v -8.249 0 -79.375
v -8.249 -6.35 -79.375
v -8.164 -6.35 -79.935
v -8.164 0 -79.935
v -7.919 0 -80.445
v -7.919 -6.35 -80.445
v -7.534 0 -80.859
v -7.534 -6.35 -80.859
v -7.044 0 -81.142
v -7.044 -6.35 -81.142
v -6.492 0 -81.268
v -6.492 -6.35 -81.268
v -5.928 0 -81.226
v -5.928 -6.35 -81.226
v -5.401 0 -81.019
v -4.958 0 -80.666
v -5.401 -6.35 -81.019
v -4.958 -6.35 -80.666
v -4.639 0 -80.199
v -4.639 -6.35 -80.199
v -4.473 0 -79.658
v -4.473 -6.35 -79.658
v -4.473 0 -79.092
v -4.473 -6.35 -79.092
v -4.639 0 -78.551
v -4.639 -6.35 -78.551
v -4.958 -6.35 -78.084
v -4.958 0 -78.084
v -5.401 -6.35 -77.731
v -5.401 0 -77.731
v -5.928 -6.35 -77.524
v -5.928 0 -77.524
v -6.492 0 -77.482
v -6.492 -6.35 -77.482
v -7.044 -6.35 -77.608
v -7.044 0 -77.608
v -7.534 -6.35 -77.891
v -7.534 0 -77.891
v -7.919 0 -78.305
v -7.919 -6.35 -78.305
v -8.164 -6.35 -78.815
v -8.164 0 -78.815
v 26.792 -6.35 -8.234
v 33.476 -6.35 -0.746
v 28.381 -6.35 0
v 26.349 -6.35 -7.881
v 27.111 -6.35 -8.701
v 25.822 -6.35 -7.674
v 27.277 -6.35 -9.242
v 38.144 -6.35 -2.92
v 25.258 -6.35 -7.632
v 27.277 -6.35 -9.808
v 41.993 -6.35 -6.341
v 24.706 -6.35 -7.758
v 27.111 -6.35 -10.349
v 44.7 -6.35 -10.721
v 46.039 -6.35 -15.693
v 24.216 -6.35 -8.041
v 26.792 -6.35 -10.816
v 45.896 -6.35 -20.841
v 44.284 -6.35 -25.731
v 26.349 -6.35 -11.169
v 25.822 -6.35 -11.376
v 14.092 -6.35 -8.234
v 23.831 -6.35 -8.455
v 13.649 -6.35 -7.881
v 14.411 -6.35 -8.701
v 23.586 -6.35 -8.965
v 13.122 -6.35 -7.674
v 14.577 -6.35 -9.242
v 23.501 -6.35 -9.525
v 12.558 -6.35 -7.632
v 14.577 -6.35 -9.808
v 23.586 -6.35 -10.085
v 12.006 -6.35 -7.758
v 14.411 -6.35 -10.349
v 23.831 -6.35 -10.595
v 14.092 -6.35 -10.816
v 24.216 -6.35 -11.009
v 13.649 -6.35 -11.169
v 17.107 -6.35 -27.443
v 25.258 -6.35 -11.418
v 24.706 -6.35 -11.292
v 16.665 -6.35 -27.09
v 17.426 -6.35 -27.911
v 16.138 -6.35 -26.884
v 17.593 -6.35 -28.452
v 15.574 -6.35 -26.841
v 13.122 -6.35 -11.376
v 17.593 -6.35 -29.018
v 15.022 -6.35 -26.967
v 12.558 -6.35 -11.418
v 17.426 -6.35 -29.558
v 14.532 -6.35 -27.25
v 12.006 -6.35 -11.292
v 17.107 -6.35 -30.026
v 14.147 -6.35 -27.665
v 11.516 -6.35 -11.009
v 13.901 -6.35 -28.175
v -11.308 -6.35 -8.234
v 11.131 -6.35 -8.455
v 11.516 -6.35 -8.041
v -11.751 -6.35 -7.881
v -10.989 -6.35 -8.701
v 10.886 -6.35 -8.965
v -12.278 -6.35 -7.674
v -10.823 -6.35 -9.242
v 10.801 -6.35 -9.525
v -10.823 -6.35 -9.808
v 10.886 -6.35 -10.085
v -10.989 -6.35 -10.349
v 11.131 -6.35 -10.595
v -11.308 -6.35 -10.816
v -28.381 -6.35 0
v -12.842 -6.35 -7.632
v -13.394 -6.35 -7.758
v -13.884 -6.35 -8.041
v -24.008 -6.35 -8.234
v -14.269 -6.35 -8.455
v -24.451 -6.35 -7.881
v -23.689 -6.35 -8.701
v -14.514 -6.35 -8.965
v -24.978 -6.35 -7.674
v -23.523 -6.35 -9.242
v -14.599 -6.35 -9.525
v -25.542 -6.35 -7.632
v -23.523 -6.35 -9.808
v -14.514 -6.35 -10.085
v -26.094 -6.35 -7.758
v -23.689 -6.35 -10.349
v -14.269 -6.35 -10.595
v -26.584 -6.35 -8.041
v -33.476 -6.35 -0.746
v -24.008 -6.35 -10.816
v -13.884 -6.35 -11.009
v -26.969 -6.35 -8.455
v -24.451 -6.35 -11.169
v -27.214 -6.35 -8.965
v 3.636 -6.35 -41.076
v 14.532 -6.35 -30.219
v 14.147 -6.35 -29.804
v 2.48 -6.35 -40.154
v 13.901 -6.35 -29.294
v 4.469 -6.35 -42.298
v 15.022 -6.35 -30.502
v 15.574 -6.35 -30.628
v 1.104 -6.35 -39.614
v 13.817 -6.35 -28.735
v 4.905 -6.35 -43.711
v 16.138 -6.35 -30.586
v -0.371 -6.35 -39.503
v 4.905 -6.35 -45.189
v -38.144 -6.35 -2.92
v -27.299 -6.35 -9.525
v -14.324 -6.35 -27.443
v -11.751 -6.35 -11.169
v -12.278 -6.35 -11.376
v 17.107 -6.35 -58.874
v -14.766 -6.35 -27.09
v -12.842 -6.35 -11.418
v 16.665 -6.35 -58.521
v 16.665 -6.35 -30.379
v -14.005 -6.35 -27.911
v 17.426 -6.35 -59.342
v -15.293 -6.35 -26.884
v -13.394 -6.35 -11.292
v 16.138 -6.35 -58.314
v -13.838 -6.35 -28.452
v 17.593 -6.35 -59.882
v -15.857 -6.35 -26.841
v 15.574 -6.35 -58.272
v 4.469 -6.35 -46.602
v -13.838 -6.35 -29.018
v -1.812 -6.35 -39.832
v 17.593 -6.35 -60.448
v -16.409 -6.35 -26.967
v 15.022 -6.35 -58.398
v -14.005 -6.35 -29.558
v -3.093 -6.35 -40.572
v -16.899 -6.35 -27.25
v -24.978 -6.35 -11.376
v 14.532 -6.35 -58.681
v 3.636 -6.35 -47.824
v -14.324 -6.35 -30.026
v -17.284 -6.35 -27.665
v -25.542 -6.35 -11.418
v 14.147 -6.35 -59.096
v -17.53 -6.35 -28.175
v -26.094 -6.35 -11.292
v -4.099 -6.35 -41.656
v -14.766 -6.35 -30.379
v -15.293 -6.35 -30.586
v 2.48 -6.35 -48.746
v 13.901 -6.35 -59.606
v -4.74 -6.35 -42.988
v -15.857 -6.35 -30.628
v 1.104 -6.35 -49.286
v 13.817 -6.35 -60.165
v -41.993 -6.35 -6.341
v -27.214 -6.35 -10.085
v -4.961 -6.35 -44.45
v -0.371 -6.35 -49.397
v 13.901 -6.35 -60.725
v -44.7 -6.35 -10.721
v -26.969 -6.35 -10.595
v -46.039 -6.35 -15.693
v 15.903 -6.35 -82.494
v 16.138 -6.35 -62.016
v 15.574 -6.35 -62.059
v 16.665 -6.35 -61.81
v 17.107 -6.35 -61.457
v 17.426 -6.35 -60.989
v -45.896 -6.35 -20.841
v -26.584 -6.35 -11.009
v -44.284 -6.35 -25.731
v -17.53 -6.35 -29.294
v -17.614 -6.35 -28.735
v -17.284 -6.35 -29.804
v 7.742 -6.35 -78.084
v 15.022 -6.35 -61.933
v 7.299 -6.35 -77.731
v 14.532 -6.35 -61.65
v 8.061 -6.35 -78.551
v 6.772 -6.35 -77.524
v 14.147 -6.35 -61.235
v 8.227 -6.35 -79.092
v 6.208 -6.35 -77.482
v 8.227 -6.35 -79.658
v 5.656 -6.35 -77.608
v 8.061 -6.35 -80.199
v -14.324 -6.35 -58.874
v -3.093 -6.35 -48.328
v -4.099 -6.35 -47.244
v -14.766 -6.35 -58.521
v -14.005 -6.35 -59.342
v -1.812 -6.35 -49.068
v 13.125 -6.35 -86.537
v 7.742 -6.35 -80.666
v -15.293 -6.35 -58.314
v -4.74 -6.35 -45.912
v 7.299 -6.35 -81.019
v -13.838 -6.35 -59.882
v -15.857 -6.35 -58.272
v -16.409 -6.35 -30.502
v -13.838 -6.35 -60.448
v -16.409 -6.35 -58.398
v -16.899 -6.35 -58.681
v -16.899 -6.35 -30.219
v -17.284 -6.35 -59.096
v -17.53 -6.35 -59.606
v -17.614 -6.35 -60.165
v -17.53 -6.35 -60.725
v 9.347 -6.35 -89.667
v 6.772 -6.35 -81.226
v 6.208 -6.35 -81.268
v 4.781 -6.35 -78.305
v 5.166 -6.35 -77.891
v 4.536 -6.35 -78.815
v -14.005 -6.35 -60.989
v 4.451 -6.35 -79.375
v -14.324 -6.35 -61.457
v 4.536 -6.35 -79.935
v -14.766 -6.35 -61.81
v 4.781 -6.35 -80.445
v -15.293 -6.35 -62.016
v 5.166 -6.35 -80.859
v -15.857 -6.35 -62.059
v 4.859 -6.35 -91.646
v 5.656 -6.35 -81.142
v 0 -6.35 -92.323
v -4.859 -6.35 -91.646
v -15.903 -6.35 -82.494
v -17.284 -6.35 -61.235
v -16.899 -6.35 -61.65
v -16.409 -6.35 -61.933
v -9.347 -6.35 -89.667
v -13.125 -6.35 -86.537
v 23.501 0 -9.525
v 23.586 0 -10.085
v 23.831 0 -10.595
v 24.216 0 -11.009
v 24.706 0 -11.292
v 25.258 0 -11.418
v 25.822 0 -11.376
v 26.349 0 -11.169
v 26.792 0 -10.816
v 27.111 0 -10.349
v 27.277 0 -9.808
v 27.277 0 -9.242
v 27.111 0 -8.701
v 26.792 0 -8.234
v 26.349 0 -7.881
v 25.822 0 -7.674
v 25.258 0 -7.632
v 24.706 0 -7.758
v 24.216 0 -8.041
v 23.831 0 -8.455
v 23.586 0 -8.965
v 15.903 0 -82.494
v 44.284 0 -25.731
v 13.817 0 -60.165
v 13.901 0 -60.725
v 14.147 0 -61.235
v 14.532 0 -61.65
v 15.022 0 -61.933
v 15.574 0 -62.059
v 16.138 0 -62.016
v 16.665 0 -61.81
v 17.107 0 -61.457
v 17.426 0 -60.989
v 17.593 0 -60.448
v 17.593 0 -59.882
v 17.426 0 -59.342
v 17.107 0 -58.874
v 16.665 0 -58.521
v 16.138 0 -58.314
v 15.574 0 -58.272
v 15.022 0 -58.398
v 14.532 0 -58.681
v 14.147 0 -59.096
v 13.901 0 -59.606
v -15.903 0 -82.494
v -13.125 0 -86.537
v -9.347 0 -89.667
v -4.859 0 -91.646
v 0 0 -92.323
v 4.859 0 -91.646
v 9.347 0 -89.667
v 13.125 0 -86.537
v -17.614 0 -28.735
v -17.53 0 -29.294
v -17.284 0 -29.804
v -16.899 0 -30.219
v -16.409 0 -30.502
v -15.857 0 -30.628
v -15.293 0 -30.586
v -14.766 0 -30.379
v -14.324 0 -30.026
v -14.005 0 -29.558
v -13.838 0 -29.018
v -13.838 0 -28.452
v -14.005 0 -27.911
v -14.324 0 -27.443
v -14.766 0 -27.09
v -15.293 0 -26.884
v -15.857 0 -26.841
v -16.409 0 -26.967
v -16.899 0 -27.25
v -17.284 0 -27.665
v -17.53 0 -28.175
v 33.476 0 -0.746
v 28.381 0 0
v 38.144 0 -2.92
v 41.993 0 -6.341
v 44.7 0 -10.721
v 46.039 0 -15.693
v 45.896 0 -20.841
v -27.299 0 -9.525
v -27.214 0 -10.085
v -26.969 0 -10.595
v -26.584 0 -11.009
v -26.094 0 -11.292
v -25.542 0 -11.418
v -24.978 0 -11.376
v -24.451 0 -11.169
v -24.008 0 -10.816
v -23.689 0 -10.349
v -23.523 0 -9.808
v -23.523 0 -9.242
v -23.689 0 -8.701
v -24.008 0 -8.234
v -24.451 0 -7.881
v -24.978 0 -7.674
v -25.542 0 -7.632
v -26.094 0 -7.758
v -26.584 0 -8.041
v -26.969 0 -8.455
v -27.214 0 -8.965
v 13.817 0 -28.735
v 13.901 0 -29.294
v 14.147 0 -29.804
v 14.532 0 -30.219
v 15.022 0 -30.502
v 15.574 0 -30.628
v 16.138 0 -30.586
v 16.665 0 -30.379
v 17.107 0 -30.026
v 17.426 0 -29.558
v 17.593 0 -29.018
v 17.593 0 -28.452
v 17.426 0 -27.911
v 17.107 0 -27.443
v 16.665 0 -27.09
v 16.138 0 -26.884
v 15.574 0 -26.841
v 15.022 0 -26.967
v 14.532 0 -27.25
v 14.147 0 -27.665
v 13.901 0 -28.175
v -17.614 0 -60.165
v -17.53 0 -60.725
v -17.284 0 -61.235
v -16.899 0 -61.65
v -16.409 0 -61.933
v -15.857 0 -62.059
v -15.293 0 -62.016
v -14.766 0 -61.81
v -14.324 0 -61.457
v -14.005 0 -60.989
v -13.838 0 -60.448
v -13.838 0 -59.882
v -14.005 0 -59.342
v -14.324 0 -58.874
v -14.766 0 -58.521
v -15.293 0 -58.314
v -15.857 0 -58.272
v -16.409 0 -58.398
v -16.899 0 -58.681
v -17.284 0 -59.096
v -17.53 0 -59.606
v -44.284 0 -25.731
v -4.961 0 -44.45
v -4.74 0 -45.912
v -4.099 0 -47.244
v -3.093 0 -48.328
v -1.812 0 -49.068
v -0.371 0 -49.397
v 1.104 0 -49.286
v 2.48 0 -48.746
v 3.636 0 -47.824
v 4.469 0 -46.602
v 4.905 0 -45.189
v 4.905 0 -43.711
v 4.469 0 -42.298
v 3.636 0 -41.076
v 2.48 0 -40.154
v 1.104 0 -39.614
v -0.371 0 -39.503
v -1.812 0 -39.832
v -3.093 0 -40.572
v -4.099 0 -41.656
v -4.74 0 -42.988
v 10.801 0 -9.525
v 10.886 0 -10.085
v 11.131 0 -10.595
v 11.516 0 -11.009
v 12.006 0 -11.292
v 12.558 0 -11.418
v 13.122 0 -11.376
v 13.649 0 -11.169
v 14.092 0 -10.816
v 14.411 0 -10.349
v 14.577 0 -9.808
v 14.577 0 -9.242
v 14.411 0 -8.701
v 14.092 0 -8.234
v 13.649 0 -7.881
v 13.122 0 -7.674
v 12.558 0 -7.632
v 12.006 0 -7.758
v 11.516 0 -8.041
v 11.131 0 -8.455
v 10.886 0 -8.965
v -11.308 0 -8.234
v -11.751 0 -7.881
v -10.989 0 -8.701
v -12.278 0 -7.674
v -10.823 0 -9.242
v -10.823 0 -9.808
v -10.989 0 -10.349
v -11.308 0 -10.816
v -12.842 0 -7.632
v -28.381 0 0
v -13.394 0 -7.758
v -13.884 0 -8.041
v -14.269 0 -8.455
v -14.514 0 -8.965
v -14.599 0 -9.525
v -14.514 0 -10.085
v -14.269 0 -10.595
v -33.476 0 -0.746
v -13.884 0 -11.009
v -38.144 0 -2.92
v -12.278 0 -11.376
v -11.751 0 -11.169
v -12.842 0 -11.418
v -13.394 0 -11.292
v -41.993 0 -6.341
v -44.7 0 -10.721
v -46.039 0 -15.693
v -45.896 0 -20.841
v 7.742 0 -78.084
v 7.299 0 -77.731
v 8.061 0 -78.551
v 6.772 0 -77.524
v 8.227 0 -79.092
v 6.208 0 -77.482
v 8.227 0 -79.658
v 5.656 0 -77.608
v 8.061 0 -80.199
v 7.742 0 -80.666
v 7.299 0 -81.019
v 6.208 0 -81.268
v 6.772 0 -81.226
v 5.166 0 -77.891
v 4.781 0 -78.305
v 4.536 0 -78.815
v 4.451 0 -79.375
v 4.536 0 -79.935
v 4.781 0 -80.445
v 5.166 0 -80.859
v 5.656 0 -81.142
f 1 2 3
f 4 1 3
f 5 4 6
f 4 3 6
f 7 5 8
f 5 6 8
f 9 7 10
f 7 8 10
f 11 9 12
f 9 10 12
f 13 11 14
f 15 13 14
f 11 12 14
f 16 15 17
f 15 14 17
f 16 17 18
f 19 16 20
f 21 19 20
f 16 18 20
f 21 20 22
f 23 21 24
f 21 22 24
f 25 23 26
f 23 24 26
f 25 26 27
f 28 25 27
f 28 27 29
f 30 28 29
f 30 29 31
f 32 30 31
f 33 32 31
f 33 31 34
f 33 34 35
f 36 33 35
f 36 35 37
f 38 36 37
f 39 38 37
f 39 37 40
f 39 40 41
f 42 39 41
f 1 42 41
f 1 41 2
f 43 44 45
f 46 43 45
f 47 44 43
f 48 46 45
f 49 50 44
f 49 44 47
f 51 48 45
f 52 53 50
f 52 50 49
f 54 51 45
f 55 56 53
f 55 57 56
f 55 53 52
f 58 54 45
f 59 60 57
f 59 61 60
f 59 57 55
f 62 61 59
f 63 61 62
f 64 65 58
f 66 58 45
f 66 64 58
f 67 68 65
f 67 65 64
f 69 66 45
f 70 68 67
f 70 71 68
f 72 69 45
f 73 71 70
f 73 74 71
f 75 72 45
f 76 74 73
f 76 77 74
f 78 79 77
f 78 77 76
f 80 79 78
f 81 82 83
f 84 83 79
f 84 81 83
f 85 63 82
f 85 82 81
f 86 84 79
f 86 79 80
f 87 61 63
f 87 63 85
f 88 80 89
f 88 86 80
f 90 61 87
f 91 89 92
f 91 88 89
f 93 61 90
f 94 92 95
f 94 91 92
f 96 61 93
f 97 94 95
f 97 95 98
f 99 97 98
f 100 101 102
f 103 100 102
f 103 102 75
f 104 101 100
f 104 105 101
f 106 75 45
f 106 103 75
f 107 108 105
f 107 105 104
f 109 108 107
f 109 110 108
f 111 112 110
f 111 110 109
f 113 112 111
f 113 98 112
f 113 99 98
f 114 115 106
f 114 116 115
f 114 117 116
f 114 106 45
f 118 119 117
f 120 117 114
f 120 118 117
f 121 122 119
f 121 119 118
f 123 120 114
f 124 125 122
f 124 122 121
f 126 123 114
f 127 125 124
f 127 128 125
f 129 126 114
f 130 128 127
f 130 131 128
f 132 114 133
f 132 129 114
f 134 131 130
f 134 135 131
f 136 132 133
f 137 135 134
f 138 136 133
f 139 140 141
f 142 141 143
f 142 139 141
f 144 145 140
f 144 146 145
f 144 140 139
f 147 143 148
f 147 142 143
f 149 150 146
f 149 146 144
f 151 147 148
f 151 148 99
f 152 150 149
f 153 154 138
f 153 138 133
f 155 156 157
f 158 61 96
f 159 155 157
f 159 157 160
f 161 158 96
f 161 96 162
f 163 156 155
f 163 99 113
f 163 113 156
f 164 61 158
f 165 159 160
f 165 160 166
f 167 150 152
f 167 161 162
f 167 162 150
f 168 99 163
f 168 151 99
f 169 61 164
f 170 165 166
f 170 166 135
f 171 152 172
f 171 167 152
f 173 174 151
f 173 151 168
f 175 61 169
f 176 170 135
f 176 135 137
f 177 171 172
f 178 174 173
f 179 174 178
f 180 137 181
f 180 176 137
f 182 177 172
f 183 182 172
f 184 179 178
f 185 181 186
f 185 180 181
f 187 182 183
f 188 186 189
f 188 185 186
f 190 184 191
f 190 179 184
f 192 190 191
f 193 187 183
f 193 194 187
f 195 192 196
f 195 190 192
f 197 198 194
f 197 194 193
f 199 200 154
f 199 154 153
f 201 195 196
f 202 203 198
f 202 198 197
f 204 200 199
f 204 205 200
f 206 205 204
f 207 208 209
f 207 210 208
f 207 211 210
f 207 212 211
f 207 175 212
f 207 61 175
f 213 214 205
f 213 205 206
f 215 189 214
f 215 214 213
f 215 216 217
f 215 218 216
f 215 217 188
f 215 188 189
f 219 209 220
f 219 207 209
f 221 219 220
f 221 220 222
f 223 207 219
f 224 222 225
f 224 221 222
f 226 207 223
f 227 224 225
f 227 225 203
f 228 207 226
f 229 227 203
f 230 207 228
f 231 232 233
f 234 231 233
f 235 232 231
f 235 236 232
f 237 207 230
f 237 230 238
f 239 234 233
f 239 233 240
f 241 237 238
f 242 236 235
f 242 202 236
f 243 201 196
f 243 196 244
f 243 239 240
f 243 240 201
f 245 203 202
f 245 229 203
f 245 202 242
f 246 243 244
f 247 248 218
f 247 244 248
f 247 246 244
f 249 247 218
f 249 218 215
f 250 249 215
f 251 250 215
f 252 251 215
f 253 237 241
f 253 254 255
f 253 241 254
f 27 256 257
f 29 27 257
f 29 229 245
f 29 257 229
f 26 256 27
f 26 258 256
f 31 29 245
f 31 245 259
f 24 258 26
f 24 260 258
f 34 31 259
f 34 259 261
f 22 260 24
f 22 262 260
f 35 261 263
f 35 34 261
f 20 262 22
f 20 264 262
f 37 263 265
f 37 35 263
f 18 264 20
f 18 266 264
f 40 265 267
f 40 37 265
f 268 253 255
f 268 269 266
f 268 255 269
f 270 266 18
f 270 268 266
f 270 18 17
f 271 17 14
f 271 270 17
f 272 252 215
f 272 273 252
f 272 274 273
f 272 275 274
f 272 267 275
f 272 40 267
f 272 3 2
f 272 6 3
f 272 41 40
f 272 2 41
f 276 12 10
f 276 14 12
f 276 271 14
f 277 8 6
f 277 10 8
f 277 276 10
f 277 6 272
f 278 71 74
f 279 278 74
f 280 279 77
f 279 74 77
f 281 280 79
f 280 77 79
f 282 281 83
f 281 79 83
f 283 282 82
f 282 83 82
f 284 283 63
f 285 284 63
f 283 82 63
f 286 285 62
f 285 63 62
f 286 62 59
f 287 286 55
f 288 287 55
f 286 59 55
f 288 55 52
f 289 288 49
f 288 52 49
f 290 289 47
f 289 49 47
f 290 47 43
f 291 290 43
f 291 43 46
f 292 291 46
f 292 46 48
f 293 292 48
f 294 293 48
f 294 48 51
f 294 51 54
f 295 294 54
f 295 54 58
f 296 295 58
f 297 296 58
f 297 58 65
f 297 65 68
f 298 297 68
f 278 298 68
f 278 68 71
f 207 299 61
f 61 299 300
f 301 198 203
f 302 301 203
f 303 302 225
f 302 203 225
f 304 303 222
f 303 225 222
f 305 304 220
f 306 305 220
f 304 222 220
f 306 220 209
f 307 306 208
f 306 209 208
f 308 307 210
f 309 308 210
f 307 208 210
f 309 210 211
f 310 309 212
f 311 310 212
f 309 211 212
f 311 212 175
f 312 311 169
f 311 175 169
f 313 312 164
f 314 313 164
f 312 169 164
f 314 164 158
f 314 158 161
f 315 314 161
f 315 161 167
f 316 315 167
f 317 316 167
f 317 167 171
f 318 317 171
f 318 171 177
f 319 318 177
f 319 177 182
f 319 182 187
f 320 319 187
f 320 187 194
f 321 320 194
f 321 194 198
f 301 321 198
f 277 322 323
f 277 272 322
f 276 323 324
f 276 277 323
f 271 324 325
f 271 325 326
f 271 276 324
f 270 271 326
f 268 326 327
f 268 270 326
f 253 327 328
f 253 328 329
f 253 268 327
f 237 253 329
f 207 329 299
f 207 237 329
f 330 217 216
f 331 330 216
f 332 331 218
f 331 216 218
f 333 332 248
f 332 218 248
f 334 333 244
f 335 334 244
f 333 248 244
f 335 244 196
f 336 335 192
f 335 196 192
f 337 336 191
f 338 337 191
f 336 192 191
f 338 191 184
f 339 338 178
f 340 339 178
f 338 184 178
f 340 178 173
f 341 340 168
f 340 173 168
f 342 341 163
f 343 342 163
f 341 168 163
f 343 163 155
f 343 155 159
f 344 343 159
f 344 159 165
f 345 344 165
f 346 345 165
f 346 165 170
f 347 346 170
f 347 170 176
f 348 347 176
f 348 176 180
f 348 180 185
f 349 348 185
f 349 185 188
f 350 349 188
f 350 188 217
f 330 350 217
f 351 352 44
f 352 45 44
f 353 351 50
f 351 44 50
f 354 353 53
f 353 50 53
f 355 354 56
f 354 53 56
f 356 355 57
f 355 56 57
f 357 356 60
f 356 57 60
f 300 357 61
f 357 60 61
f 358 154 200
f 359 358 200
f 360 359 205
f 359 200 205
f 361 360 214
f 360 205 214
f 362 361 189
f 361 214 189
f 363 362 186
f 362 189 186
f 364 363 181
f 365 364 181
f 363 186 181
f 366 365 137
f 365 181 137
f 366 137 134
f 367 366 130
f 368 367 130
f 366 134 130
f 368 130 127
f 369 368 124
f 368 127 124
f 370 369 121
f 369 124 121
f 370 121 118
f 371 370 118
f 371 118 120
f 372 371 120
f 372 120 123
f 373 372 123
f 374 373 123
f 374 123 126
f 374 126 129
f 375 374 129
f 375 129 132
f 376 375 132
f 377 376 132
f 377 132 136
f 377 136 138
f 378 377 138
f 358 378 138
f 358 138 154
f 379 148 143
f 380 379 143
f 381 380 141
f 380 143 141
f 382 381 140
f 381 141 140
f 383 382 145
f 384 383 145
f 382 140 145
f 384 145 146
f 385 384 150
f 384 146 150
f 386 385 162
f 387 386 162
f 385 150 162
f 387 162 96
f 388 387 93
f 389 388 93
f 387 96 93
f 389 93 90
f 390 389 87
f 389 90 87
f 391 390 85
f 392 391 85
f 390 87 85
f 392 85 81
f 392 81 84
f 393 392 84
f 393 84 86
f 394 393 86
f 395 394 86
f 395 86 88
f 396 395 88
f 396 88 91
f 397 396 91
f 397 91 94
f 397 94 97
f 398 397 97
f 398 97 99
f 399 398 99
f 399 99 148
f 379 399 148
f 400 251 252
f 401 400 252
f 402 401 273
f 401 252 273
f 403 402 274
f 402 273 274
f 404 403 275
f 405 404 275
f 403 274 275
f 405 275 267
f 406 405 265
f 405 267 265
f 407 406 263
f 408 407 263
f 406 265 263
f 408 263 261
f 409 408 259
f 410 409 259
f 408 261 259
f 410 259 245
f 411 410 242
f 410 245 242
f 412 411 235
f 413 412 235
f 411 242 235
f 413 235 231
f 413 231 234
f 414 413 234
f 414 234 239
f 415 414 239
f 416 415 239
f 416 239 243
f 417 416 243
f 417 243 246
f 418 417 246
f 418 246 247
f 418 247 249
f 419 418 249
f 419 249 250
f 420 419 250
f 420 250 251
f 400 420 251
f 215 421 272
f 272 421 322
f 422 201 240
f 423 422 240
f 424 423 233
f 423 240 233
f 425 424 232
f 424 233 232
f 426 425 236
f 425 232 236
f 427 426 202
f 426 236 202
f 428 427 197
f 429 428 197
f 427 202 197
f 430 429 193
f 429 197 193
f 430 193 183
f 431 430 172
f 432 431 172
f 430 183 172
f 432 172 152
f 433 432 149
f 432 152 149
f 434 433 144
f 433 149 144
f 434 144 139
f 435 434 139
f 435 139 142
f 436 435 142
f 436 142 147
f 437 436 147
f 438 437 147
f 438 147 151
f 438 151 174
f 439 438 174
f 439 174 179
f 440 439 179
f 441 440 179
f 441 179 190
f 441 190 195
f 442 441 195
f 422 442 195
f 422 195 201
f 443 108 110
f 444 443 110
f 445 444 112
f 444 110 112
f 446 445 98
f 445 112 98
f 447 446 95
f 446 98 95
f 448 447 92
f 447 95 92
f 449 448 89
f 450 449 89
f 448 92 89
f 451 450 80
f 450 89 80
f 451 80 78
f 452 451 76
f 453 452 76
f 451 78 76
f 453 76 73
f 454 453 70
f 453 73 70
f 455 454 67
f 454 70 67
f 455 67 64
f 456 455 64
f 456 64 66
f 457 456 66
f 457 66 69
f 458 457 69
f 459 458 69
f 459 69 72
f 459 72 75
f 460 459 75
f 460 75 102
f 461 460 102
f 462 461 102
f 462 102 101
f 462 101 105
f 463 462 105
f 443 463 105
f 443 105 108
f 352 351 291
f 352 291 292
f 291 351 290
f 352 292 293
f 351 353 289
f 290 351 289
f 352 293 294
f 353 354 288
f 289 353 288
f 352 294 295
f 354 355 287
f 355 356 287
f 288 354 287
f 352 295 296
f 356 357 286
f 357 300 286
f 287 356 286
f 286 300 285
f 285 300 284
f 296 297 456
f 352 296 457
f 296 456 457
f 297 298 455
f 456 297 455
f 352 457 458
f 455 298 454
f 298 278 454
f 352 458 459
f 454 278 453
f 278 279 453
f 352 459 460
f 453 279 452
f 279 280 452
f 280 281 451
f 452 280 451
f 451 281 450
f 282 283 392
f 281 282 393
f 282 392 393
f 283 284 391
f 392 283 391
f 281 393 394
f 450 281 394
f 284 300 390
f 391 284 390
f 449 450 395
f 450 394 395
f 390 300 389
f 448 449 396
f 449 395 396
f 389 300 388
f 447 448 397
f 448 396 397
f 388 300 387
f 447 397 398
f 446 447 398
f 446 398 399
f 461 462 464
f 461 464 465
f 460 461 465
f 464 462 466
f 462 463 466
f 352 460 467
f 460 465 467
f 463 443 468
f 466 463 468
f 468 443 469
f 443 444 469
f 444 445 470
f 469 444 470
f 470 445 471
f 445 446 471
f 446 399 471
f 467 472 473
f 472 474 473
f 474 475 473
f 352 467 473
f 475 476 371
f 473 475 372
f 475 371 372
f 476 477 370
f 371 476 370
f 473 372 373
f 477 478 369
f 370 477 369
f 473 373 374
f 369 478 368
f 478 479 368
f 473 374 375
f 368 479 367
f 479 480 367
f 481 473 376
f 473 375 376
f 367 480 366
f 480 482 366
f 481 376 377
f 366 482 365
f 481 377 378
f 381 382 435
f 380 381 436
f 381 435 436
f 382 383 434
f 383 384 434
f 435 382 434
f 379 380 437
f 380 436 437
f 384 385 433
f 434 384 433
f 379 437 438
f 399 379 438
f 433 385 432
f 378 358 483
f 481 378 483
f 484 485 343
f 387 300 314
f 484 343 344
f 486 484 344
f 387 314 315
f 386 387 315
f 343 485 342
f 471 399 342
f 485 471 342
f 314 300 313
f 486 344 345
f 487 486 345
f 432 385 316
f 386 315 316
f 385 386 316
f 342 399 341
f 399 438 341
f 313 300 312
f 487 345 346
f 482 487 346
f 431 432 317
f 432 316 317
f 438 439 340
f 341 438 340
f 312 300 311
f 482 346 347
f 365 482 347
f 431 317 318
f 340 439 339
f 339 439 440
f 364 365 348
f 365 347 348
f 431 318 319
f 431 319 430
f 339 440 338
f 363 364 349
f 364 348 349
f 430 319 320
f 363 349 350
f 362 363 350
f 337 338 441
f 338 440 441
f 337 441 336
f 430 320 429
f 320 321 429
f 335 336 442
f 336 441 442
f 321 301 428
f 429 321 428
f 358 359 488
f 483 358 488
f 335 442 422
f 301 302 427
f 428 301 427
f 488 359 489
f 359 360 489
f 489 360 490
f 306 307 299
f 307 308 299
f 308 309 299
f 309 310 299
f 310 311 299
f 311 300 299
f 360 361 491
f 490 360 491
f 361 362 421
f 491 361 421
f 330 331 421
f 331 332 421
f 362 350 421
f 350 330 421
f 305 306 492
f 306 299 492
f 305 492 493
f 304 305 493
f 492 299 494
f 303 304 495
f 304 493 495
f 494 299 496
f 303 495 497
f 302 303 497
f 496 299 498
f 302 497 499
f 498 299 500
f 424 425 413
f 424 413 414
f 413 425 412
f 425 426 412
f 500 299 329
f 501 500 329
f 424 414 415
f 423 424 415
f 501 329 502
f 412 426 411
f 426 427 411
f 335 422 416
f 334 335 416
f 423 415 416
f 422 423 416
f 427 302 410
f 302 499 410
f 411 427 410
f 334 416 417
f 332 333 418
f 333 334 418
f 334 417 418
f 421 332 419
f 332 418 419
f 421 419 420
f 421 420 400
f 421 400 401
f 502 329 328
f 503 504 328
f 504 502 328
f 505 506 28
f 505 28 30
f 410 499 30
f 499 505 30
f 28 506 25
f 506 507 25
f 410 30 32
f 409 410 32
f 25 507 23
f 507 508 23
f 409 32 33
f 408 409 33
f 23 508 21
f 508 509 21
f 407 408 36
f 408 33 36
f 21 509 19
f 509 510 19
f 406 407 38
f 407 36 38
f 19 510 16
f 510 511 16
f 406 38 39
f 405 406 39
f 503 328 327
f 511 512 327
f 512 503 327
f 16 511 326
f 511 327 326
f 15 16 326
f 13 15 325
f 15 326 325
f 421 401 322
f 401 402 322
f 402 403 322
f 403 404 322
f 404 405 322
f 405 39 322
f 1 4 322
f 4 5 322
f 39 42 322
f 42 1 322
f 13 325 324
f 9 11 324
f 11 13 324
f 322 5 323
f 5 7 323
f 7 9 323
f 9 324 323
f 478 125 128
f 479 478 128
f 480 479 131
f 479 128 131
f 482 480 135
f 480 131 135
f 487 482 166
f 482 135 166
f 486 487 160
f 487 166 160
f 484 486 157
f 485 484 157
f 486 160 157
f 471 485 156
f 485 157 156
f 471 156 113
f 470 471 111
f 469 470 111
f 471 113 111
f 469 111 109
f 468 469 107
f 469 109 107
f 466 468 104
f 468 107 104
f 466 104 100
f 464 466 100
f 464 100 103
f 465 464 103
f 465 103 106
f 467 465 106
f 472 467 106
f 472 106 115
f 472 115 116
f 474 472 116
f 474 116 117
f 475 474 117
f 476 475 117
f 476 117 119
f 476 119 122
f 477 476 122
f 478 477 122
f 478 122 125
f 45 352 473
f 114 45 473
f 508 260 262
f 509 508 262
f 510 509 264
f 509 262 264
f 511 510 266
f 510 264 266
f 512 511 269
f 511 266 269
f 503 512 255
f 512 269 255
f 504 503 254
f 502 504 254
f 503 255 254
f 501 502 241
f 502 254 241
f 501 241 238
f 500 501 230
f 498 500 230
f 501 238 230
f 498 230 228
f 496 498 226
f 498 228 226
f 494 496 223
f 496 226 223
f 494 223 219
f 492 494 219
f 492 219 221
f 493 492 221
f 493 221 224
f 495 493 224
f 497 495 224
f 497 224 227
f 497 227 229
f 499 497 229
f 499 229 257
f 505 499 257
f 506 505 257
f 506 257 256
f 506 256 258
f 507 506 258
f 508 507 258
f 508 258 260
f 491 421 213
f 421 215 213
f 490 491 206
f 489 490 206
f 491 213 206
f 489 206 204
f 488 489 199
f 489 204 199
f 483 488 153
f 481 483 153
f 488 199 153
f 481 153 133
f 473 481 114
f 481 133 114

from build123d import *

# Parameters (mm, degrees)
BOSS_EXTRUDE1_DEPTH       = 6.35
F_6_CLEARANCE_HOLE1_D     = 3.7973
FILLET1_R                 = 17.78
F_7_16_20_TAPPED_HOLE1_D  = 9.92124
F_6_CLEARANCE_HOLE2_D     = 3.7973
F_6_CLEARANCE_HOLE2_DEPTH = 6.35


with BuildPart() as part:
    # Sketch1 → Boss-Extrude1 (new body)
    with BuildSketch(Plane(origin=(0, 0, 0), x_dir=(1, 0, 0), z_dir=(0, 1, 0))):
        Polygon((-57.15, 0), (0, 114.3), (57.15, 0), align=None)
    extrude(amount=-BOSS_EXTRUDE1_DEPTH)

    # #6 Clearance Hole1 (through all)
    with Locations(Plane(origin=(0, 0, 0), x_dir=(1, 0, 0), z_dir=(0, 1, 0))):
        with Locations((25.4, 9.525), (12.7, 9.525), (-6.35, 79.375), (6.35, 79.375), (-25.4, 9.525), (-12.7, 9.525)):
            Hole(F_6_CLEARANCE_HOLE1_D / 2)

    # Fillet1
    fillet1_edges = [part.edges().sort_by_distance(p)[0] for p in [
        (-57.15, -3.175, 0),
        (0, -3.175, -114.3),
        (57.15, -3.175, 0),
    ]]
    fillet(fillet1_edges, radius=FILLET1_R)

    # 7/16-20 Tapped Hole1 (through all)
    with Locations(Plane(origin=(0, 0, 0), x_dir=(1, 0, 0), z_dir=(0, 1, 0))):
        with Locations((0, 44.45)):
            Hole(F_7_16_20_TAPPED_HOLE1_D / 2)

    # #6 Clearance Hole2
    with Locations(Plane(origin=(0, 0, 0), x_dir=(1, 0, 0), z_dir=(0, 1, 0))):
        with Locations((-15.715448212, 60.165448212), (15.715448212, 28.734551788), (-15.715448212, 28.734551788), (15.715448212, 60.165448212)):
            Hole(F_6_CLEARANCE_HOLE2_D / 2, depth=F_6_CLEARANCE_HOLE2_DEPTH)


solid = part.part
